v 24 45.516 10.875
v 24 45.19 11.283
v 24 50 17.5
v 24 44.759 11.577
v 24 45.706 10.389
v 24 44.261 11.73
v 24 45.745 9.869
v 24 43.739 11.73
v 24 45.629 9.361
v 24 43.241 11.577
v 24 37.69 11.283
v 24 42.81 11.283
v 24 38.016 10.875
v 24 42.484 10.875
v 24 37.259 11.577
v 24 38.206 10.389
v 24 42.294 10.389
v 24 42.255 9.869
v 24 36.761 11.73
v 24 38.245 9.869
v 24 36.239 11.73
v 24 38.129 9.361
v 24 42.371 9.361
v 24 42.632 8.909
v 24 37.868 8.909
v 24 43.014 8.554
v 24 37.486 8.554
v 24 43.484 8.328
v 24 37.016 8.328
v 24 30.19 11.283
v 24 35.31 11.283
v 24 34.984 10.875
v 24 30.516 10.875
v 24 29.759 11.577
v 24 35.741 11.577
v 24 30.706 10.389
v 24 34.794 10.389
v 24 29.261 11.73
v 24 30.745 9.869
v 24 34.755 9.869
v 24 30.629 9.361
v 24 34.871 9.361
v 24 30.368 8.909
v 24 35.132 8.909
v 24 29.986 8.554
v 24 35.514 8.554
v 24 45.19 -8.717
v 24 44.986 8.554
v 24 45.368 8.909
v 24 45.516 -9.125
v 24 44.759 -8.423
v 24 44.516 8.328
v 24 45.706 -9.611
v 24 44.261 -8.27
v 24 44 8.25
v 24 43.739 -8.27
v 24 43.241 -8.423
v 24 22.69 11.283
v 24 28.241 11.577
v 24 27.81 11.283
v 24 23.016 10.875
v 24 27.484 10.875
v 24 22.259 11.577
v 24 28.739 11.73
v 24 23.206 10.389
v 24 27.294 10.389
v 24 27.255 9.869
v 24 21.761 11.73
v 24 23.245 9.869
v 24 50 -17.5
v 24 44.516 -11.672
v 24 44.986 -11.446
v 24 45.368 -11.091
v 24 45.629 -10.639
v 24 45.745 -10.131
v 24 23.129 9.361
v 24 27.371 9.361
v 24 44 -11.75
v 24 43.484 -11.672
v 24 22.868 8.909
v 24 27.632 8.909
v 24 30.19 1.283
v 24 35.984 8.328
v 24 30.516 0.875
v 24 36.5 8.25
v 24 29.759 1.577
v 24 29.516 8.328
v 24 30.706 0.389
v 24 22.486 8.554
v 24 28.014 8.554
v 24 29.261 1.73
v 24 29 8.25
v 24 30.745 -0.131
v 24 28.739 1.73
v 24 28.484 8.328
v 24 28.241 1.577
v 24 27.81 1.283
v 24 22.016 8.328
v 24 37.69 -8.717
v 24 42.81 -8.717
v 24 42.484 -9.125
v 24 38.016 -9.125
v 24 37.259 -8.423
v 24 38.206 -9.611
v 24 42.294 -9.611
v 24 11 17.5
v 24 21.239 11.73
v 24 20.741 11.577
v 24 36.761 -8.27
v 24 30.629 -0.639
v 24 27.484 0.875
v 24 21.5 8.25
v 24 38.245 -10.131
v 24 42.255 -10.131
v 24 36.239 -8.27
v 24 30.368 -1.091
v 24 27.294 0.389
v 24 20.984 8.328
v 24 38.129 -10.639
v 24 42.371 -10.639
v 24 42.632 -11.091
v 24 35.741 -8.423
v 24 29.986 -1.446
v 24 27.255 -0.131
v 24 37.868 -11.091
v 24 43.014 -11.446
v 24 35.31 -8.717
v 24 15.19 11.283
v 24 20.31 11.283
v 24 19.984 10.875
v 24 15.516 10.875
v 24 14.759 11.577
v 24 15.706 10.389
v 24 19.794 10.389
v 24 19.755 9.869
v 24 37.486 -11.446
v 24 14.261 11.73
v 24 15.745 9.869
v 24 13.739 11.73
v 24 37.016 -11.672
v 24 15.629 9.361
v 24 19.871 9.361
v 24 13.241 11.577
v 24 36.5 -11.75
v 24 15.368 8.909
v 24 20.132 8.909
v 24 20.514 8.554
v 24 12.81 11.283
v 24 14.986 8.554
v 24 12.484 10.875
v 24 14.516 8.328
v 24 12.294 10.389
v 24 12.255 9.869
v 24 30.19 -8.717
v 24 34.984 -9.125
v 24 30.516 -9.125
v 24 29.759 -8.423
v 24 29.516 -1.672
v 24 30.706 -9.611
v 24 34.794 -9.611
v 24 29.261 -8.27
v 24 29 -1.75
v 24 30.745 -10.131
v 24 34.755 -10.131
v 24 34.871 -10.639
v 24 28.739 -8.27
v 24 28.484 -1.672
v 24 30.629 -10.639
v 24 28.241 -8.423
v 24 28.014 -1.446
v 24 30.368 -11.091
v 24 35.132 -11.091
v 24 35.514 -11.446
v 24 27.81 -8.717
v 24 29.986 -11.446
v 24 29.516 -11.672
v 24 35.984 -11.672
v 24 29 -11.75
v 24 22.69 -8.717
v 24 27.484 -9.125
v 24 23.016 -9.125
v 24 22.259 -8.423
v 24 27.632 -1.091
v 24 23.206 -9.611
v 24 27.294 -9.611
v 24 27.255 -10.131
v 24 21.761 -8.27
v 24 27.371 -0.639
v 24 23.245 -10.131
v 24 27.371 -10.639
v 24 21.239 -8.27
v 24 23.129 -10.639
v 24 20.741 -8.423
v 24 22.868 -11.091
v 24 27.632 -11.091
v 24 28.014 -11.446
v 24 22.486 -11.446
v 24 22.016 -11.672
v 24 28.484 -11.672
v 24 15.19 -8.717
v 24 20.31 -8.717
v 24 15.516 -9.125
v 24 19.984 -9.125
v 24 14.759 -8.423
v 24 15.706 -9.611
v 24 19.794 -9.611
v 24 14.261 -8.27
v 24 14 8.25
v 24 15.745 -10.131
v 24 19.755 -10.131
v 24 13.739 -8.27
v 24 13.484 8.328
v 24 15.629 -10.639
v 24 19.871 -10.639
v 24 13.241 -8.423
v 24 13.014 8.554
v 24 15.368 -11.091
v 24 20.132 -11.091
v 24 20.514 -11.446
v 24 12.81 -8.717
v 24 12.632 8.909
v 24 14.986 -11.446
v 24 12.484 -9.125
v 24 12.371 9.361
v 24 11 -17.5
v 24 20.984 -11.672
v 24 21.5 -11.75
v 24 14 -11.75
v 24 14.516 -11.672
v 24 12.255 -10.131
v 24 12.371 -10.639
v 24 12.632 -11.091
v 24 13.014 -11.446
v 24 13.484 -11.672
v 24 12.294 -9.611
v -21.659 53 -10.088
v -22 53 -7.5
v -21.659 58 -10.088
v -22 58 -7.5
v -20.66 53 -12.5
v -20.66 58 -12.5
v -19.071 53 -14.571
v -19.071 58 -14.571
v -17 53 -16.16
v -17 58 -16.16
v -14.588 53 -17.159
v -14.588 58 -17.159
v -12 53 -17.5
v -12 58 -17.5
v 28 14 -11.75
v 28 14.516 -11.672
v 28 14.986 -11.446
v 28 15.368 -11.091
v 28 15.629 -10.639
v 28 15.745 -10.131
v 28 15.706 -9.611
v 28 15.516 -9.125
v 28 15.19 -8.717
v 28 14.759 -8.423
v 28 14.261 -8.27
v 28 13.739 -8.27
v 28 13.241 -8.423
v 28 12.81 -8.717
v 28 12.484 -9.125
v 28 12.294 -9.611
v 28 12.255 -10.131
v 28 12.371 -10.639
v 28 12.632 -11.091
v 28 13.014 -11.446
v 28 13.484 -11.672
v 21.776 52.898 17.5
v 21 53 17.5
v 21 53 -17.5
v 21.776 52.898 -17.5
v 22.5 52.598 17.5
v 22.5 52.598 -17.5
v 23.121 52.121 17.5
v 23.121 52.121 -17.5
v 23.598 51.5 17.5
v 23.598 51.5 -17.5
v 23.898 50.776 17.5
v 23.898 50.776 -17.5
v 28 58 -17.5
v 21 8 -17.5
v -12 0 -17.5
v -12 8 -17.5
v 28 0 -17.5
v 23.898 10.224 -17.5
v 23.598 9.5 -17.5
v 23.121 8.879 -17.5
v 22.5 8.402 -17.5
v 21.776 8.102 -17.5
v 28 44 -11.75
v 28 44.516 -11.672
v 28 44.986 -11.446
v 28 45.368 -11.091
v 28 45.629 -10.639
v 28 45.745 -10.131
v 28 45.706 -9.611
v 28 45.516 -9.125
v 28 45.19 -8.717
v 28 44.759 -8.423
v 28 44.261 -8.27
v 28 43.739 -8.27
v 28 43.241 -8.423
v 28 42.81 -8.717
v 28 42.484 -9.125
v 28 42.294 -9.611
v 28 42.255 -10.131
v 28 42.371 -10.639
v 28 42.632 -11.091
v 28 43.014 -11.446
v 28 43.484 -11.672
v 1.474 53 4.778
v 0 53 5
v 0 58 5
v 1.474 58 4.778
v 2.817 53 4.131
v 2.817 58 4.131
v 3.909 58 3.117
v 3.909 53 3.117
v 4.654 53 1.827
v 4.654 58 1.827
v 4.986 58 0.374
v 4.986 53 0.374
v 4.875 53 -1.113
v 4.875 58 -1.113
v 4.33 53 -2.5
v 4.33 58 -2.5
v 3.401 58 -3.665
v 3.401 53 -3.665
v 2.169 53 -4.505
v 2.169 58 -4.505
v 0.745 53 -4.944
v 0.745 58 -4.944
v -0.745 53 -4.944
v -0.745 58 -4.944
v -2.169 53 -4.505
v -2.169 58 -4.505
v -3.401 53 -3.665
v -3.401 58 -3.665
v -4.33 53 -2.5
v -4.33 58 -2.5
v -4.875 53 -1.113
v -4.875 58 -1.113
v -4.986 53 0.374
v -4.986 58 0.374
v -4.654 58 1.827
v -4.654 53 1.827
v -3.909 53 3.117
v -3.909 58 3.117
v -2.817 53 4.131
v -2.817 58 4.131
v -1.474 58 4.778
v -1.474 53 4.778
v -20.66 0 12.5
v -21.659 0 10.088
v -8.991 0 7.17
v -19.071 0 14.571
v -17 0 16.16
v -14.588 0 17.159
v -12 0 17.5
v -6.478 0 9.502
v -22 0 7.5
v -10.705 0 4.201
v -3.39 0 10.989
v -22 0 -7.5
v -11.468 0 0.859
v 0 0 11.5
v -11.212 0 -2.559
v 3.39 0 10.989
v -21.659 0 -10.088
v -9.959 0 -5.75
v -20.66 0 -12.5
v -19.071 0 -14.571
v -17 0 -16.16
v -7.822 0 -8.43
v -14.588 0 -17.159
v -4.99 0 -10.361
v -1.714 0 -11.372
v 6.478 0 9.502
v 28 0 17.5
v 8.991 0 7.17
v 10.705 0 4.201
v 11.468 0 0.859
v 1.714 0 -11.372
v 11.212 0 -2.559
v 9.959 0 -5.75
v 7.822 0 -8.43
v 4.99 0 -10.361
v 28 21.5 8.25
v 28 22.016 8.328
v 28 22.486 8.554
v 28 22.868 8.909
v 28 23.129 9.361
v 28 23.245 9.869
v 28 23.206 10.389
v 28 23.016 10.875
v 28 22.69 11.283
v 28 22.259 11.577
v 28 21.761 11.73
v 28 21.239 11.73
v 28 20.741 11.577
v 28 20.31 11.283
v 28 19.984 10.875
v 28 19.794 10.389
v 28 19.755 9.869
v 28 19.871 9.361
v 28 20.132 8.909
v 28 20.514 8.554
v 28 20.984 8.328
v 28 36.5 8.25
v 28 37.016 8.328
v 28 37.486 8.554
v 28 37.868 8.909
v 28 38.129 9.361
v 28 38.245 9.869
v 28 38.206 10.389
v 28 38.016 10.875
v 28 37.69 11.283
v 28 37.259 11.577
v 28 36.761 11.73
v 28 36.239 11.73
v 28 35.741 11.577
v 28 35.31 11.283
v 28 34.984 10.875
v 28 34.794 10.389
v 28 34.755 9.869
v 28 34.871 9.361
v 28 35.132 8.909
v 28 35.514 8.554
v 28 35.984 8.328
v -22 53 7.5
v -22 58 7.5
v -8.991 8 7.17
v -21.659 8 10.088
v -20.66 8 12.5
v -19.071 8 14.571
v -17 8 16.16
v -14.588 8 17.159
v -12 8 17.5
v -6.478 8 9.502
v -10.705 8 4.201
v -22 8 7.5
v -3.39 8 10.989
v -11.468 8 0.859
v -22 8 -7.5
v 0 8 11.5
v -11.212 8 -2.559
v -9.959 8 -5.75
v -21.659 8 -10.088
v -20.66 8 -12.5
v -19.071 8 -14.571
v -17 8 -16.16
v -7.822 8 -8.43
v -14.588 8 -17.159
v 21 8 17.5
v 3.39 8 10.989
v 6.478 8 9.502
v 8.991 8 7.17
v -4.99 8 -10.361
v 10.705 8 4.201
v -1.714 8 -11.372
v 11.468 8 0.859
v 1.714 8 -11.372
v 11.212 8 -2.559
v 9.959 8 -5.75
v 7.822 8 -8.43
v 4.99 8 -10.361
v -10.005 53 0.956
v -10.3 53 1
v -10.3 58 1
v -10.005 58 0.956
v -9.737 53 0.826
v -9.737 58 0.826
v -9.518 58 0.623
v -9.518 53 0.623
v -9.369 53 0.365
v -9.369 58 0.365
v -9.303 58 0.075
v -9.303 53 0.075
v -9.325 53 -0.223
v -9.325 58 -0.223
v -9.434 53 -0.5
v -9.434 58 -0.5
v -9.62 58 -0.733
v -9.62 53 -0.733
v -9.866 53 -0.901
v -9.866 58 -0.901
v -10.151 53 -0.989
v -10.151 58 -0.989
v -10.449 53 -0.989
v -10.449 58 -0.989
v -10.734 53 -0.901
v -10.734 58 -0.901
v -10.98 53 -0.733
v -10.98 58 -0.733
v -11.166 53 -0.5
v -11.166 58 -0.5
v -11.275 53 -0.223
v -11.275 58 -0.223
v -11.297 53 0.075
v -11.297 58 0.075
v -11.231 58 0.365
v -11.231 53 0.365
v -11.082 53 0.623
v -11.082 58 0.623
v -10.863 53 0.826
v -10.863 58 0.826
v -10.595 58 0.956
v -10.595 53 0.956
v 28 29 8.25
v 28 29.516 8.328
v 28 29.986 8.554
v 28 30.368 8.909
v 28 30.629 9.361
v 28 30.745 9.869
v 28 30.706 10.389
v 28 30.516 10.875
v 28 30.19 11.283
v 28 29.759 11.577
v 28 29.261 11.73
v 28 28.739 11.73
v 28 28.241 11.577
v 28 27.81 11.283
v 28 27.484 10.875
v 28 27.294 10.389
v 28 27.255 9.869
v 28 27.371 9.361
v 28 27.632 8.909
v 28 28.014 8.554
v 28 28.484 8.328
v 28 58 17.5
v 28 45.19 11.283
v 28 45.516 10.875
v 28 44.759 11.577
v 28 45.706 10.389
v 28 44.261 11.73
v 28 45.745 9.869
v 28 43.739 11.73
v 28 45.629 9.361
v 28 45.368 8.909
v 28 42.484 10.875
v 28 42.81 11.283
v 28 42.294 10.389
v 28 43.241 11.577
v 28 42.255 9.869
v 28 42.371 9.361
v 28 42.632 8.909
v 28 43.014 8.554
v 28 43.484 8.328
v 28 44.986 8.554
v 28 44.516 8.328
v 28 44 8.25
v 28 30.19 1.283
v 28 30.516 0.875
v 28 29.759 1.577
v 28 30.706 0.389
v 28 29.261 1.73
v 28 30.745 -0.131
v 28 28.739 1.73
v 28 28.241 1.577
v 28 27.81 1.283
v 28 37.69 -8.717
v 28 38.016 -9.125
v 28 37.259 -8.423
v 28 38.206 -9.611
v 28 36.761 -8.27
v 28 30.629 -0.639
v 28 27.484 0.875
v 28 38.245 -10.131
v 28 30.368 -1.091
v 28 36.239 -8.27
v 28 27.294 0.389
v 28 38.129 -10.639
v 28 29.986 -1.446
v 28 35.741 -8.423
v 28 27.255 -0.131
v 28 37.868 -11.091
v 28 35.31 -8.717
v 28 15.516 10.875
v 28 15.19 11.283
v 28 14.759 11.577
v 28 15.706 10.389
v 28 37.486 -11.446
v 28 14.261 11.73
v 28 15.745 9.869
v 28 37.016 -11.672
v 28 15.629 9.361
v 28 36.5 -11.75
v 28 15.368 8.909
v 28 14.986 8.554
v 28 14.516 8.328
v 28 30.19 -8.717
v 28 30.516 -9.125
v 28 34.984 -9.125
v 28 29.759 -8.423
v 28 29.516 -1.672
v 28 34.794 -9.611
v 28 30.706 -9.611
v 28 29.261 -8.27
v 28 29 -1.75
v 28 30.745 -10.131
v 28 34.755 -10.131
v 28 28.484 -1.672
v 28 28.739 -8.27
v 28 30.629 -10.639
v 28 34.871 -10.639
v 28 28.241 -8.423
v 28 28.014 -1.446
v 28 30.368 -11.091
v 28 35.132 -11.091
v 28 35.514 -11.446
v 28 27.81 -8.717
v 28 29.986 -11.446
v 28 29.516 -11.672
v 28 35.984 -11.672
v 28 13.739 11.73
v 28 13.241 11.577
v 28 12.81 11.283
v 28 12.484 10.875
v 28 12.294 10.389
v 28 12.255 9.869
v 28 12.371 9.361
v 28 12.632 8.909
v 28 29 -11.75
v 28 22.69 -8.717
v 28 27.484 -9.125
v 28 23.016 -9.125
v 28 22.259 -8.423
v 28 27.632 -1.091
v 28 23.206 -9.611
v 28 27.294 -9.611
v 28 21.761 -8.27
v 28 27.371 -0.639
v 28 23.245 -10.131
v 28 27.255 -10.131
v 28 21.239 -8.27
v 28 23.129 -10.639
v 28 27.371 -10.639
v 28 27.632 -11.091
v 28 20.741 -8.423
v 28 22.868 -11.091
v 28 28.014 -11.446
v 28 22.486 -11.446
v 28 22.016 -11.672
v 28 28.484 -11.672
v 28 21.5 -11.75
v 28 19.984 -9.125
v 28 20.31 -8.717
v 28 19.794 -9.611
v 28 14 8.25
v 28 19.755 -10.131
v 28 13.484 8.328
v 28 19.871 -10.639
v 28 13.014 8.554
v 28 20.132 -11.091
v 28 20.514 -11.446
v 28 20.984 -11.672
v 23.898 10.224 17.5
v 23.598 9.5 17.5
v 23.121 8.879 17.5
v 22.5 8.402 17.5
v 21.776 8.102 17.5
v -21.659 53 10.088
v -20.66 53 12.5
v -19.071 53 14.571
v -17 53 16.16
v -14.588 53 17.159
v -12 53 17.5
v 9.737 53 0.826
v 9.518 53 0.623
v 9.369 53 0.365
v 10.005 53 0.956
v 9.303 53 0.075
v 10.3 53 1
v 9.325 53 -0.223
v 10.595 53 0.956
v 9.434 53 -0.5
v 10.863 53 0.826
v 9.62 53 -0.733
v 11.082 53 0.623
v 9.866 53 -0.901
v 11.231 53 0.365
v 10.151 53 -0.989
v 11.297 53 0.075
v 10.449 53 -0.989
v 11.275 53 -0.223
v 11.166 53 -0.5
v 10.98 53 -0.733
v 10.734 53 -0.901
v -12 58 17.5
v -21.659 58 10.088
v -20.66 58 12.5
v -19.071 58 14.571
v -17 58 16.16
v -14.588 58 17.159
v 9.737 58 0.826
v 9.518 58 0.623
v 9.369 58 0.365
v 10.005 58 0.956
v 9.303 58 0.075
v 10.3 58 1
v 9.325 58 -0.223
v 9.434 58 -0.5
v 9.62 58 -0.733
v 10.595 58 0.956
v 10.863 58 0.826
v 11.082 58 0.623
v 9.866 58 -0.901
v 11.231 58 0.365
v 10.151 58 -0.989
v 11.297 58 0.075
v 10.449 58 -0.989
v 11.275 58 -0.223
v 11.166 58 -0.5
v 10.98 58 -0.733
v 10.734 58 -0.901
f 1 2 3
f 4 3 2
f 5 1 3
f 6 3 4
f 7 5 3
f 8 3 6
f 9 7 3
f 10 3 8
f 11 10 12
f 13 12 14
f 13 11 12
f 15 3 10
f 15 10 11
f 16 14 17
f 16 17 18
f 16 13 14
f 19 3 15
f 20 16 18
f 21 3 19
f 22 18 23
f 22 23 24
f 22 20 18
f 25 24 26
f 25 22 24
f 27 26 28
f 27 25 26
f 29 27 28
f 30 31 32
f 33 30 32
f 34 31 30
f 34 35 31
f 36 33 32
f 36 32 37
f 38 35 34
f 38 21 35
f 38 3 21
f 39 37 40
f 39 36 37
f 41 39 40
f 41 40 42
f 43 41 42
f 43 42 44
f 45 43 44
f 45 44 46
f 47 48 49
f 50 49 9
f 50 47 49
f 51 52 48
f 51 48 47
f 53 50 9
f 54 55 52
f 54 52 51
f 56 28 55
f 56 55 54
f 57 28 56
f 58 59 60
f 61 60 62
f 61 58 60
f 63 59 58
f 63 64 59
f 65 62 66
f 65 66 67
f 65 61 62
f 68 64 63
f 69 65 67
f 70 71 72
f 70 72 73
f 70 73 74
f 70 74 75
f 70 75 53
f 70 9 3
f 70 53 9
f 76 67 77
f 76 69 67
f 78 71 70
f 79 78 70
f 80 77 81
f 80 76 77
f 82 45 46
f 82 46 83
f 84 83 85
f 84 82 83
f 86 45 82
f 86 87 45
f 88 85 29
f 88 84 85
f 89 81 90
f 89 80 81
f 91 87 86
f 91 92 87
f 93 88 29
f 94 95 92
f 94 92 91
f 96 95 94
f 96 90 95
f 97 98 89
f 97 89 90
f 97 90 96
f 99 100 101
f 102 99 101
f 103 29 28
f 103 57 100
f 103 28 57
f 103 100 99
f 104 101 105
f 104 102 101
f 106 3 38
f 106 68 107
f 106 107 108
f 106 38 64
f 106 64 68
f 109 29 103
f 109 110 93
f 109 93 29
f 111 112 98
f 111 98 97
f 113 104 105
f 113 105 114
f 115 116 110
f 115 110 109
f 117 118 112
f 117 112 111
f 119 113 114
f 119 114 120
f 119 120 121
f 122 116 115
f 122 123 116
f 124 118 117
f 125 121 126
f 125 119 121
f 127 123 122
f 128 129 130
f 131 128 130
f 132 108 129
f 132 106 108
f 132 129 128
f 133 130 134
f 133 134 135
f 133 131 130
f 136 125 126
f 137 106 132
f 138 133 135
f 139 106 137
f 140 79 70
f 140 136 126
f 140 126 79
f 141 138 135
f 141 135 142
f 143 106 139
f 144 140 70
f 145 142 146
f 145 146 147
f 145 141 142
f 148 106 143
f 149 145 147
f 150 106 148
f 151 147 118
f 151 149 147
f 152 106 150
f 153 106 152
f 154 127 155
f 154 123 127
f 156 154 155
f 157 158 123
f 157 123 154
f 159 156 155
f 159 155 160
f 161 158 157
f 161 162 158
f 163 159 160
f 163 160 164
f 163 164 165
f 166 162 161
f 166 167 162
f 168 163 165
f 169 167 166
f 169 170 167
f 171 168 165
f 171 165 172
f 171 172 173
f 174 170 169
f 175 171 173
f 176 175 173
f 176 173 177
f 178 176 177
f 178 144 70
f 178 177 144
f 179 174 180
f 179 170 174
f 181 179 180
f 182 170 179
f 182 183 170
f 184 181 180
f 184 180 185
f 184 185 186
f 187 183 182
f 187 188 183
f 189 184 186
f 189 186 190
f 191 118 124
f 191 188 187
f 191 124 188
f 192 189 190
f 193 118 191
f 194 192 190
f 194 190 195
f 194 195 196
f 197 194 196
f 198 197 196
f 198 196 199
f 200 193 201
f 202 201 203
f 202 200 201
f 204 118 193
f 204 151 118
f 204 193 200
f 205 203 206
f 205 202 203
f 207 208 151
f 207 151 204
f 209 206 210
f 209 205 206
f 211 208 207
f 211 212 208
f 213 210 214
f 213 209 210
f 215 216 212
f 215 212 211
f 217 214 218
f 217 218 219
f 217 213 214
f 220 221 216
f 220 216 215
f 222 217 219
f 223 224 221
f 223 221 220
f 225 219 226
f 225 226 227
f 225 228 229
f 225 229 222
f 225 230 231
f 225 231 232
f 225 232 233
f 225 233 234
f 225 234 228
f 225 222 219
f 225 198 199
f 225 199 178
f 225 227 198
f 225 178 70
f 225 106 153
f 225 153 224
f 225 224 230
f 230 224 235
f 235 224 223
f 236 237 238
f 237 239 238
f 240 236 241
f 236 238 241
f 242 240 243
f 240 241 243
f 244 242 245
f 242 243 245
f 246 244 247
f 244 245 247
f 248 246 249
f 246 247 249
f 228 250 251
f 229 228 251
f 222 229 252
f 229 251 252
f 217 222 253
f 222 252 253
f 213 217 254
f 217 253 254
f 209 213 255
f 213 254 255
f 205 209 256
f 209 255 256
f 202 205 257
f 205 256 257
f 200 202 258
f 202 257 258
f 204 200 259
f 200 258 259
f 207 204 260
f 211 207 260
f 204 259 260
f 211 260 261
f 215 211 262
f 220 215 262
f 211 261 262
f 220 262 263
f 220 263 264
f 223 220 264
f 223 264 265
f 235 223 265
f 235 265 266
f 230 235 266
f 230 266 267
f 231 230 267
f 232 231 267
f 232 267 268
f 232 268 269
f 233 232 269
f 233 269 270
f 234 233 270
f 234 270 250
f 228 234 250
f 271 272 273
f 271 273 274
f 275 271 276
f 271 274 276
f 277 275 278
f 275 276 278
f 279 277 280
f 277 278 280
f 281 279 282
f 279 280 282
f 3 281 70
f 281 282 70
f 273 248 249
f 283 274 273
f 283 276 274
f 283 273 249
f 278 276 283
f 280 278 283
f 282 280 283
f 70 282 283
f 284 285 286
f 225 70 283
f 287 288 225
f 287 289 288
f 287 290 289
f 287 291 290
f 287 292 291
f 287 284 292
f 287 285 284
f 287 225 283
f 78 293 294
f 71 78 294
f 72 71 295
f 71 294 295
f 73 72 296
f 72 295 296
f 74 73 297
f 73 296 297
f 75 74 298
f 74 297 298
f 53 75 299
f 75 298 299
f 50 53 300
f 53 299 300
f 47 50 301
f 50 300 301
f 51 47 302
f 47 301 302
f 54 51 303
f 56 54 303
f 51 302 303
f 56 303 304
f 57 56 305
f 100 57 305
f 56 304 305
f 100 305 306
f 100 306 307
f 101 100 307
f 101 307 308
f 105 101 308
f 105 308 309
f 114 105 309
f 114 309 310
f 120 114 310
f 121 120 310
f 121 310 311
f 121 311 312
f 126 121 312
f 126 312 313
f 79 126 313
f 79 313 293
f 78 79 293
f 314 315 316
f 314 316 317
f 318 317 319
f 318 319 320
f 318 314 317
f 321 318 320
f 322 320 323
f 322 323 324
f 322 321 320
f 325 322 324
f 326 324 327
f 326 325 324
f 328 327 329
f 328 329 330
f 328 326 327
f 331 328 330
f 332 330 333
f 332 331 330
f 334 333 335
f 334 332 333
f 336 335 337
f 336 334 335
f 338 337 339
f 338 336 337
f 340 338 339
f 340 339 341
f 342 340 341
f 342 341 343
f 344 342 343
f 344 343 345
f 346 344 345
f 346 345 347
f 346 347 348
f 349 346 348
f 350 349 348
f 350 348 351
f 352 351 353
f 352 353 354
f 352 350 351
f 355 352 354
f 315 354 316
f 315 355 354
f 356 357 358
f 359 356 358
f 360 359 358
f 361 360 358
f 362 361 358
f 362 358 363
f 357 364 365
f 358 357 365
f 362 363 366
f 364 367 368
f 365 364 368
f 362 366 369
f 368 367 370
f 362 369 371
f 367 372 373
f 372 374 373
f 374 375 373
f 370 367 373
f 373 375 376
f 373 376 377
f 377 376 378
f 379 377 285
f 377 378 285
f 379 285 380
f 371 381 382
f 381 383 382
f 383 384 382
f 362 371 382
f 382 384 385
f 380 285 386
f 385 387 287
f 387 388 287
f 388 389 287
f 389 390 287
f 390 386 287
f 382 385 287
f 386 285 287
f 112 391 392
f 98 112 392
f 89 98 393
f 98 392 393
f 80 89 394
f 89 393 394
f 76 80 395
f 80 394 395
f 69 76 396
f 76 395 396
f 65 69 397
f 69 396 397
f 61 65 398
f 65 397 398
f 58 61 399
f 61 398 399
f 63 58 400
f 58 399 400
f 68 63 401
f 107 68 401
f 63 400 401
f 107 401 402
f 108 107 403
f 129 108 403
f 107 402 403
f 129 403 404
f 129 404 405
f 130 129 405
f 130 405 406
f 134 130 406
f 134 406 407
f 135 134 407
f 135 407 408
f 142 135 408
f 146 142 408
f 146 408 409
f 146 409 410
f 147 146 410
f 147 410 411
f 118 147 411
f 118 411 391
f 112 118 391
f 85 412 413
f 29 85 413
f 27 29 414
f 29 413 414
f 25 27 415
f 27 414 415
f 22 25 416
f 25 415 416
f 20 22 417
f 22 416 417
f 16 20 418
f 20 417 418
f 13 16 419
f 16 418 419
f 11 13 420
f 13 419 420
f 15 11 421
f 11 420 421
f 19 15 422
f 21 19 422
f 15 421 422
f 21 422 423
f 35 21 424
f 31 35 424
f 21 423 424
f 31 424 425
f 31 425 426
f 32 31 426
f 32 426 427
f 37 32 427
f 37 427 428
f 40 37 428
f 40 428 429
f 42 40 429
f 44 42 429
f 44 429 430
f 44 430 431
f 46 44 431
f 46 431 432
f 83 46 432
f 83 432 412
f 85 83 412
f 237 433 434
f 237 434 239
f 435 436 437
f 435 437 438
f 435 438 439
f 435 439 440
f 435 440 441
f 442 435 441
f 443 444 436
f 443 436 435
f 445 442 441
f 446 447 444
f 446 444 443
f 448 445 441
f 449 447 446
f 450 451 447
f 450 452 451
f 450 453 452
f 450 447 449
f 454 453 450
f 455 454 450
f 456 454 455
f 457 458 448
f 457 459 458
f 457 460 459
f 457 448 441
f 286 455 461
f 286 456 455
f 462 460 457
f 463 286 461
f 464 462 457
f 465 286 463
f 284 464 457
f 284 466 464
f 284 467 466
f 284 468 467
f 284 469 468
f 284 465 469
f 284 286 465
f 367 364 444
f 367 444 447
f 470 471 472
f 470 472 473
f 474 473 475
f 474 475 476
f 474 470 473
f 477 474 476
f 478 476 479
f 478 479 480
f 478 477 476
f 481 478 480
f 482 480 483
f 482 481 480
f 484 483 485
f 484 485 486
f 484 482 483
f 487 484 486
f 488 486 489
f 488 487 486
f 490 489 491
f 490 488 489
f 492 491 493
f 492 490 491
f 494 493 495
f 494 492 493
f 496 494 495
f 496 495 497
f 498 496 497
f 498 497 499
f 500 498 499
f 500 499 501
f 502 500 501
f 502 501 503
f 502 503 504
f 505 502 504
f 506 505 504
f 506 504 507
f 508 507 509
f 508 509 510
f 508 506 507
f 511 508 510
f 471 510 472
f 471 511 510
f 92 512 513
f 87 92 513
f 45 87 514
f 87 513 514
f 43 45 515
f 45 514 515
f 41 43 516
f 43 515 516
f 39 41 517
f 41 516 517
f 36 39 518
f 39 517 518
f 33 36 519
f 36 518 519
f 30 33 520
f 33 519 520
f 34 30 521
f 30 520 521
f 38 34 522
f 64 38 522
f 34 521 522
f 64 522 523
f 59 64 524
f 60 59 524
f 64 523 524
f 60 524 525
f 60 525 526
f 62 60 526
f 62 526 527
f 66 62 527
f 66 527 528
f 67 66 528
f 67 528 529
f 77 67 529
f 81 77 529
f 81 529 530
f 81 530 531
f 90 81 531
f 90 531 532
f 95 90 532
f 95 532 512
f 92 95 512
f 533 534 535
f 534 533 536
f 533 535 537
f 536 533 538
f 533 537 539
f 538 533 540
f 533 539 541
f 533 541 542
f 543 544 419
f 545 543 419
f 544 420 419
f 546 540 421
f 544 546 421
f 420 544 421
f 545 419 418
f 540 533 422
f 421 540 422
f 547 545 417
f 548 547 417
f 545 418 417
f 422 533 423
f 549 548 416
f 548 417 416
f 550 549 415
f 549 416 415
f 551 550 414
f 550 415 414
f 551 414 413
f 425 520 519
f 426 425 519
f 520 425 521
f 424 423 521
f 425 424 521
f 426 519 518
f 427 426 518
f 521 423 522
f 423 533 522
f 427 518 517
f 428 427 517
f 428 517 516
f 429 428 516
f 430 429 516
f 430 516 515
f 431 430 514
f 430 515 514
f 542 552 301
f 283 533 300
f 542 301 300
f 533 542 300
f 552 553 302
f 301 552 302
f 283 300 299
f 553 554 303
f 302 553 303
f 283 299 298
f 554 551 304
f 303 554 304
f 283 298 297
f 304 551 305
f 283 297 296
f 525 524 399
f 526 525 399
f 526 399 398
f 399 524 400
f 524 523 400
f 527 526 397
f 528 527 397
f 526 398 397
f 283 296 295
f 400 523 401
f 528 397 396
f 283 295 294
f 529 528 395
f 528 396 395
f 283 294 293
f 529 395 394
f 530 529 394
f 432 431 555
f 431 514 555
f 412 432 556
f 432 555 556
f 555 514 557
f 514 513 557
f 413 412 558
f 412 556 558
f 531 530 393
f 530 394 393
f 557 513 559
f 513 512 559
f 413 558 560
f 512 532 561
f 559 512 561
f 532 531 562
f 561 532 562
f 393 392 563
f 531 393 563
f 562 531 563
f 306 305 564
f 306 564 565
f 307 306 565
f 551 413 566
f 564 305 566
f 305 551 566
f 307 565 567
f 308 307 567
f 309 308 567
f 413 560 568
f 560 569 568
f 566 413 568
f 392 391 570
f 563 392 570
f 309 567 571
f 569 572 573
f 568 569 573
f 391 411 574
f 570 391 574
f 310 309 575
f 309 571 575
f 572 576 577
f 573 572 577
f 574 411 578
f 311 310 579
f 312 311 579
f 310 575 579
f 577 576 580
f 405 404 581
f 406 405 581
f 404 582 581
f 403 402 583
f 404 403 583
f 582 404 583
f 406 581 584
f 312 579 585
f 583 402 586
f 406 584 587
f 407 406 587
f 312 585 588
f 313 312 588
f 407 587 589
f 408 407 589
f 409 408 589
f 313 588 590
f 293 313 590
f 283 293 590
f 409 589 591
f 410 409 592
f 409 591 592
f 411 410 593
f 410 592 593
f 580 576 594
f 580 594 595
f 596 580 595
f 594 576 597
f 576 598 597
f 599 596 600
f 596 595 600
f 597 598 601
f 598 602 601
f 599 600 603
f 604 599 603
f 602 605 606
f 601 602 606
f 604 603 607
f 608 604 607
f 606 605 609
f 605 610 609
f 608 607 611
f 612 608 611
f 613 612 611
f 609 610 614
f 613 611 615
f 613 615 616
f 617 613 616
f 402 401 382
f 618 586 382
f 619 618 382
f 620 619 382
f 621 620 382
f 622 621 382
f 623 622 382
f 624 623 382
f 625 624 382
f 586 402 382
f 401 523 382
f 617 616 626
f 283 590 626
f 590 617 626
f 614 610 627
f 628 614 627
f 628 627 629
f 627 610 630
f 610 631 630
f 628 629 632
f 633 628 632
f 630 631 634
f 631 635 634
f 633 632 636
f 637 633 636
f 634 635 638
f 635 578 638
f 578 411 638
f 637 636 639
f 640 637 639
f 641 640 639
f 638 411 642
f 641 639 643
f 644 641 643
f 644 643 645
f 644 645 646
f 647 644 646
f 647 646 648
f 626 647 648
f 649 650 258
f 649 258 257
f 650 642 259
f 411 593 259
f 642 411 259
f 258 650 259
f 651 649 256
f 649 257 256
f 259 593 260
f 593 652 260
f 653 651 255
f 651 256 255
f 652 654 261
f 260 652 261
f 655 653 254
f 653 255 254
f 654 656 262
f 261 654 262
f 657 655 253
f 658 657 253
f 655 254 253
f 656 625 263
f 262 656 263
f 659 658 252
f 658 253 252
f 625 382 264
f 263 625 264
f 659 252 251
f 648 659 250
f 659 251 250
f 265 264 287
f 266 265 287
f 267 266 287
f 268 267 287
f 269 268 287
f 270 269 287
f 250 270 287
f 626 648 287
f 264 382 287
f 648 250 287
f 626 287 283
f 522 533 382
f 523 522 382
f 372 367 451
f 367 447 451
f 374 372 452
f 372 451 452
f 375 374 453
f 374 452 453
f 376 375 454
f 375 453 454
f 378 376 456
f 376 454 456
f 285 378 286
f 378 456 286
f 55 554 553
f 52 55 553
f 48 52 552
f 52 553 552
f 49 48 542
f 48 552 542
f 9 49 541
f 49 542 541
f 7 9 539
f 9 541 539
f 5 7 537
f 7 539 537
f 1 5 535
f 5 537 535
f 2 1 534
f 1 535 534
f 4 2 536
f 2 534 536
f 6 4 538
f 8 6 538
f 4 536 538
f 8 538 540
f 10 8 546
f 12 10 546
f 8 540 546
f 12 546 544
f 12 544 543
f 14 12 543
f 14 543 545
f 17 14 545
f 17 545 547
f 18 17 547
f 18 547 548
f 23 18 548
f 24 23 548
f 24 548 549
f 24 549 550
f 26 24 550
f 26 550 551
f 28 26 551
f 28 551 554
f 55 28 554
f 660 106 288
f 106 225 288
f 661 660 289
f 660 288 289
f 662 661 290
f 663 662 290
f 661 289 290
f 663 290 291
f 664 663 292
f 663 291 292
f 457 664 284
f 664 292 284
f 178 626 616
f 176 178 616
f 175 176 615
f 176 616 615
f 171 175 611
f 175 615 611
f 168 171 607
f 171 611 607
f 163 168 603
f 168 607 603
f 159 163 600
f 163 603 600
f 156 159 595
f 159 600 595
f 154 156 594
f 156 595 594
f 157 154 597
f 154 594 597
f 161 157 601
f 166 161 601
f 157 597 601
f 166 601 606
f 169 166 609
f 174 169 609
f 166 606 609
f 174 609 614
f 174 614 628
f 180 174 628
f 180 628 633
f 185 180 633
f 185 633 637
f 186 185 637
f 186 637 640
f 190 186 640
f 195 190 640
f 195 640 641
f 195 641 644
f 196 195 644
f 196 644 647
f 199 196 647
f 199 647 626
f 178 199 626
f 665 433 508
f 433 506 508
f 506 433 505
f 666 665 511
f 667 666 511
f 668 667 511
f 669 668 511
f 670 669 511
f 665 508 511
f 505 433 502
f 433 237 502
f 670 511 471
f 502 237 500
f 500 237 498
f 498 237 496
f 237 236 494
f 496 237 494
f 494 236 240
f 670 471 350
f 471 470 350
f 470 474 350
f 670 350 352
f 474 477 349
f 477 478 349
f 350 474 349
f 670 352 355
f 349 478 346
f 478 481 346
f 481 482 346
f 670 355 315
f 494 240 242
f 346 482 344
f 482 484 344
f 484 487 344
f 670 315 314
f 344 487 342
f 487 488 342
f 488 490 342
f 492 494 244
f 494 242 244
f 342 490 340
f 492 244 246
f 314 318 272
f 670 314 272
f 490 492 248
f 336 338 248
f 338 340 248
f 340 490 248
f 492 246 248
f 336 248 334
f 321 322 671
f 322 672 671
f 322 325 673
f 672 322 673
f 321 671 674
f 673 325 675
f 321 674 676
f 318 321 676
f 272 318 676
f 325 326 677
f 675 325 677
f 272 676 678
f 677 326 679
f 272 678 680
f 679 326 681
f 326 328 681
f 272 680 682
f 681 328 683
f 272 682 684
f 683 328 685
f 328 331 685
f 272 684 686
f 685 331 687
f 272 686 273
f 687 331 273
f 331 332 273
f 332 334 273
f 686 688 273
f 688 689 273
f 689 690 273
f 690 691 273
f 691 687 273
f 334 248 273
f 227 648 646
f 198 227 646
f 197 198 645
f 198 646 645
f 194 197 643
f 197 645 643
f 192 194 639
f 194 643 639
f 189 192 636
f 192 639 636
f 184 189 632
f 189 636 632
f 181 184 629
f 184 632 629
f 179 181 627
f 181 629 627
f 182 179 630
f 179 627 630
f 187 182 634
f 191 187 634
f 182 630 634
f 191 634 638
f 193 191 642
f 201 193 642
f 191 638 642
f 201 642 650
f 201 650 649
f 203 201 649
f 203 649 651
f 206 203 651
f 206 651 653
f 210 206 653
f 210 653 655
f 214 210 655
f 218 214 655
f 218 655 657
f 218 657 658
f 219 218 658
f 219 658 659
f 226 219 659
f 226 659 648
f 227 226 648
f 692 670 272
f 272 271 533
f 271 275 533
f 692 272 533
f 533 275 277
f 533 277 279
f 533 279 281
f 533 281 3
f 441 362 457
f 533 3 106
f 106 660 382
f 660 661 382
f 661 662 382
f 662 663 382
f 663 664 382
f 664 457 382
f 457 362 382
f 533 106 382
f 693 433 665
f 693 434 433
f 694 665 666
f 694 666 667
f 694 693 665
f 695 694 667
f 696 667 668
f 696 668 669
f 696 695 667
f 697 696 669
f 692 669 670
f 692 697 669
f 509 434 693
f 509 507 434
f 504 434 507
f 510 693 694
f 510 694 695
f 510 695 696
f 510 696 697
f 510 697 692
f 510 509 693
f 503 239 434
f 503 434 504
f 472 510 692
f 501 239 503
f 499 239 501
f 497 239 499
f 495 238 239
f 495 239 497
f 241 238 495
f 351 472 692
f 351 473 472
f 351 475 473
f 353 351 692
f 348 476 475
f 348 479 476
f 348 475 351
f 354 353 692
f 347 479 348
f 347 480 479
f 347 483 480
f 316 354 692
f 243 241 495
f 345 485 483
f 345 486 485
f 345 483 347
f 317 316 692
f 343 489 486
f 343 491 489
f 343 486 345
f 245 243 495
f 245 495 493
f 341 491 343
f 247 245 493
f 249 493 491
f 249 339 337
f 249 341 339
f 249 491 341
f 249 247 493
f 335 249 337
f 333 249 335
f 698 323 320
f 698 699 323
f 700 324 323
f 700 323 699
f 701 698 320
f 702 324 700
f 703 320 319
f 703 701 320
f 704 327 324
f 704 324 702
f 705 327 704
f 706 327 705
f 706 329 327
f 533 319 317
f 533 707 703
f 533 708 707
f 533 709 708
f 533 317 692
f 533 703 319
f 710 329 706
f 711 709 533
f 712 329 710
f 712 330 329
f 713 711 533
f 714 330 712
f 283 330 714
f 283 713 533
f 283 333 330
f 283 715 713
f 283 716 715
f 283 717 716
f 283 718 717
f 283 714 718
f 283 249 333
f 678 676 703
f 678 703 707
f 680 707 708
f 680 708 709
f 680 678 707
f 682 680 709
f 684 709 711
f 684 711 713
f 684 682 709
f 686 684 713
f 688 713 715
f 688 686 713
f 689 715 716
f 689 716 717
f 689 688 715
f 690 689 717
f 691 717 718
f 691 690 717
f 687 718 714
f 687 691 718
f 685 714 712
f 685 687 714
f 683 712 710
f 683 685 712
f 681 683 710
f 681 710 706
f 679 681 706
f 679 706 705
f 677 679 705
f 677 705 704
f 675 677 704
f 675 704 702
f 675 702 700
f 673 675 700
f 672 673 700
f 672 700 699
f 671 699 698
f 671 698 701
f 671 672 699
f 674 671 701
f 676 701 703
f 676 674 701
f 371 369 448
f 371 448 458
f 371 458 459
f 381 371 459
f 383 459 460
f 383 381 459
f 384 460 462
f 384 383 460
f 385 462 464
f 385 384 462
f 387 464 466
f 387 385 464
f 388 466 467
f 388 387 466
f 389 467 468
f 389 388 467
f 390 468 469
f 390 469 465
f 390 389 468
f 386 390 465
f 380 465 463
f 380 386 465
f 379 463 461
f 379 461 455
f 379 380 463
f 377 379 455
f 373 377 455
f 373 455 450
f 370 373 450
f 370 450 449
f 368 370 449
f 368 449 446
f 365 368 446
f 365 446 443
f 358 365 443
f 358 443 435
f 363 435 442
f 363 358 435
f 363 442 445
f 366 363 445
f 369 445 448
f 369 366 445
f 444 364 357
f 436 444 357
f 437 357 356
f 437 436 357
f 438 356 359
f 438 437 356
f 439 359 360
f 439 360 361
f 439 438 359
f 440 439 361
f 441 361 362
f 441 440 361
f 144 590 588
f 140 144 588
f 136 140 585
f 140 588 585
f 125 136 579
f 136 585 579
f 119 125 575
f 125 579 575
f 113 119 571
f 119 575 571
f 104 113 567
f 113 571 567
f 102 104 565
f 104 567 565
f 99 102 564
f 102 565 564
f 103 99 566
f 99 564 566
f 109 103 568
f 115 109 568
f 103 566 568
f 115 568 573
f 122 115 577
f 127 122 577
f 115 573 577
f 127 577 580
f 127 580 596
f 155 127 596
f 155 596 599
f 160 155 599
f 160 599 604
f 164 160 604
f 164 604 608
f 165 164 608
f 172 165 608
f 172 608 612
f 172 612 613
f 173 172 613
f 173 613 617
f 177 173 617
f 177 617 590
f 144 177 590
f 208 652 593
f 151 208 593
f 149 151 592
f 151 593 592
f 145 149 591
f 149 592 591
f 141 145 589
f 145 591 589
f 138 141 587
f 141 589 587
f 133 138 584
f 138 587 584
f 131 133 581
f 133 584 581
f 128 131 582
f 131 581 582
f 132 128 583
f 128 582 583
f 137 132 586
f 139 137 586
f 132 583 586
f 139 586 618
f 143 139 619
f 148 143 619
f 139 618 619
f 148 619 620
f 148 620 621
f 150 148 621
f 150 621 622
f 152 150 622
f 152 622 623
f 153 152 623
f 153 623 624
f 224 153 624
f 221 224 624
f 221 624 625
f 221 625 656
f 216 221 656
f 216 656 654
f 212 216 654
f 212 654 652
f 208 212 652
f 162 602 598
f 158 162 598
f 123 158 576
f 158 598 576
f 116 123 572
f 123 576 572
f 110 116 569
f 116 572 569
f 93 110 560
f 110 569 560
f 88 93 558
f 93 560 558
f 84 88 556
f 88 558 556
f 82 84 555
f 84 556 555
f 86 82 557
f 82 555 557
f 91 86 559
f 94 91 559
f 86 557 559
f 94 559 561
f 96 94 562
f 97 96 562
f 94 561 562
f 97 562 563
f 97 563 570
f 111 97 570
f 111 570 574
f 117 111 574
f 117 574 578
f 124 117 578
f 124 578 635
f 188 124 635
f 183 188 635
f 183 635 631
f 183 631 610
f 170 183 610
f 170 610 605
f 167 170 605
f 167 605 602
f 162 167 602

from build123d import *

# Parameters (mm, degrees)
SKETCH1_W           = 50
SKETCH1_H           = 35
SKETCH1_R           = 11.5
BOSS_EXTRUDE1_DEPTH = 8
SKETCH2_W           = 4
SKETCH2_H           = 35
BOSS_EXTRUDE2_DEPTH = 45
SKETCH3_W           = 50
SKETCH3_H           = 35
SKETCH3_R           = 5
SKETCH3_R_2         = 1
BOSS_EXTRUDE3_DEPTH = 5
FILLET1_R           = 10
FILLET2_R           = 3
SKETCH4_R           = 1.75
CUT_EXTRUDE1_DEPTH  = 79.550938887


with BuildPart() as part:
    # Sketch1 → Boss-Extrude1 (new body)
    with BuildSketch(Plane(origin=(0, 0, 0), x_dir=(1, 0, 0), z_dir=(0, 1, 0))):
        with Locations((3, 0)):
            Rectangle(SKETCH1_W, SKETCH1_H)
        Circle(SKETCH1_R, mode=Mode.SUBTRACT)
    extrude(amount=BOSS_EXTRUDE1_DEPTH)

    # Sketch2 → Boss-Extrude2 (add)
    with BuildSketch(Plane(origin=(0, 8, 0), x_dir=(1, 0, 0), z_dir=(0, 1, 0))):
        with Locations((26, 0)):
            Rectangle(SKETCH2_W, SKETCH2_H)
    extrude(amount=BOSS_EXTRUDE2_DEPTH)

    # Sketch3 → Boss-Extrude3 (add)
    with BuildSketch(Plane(origin=(0, 53, 0), x_dir=(1, 0, 0), z_dir=(0, 1, 0))):
        with Locations((3, 0)):
            Rectangle(SKETCH3_W, SKETCH3_H)
        Circle(SKETCH3_R, mode=Mode.SUBTRACT)
        with Locations((10.3, 0)):
            Circle(SKETCH3_R_2, mode=Mode.SUBTRACT)
        with Locations((-10.3, 0)):
            Circle(SKETCH3_R_2, mode=Mode.SUBTRACT)
    extrude(amount=BOSS_EXTRUDE3_DEPTH)

    # Fillet1
    fillet1_edges = [part.edges().sort_by_distance(p)[0] for p in [
        (-22, 55.5, 17.5),
        (-22, 55.5, -17.5),
        (-22, 4, -17.5),
        (-22, 4, 17.5),
    ]]
    fillet(fillet1_edges, radius=FILLET1_R)

    # Fillet2
    fillet2_edges = [part.edges().sort_by_distance(p)[0] for p in [
        (24, 53, 0),
        (24, 8, 0),
    ]]
    fillet(fillet2_edges, radius=FILLET2_R)

    # Sketch4 → Cut-Extrude1 (cut, through all)
    with BuildSketch(Plane(origin=(28, 0, 0), x_dir=(0, 0, -1), z_dir=(1, 0, 0))):
        with Locations((0, 29)):
            Circle(SKETCH4_R)
        with Locations((-10, 36.5)):
            Circle(SKETCH4_R)
        with Locations((10, 21.5)):
            Circle(SKETCH4_R)
        with Locations((-10, 44)):
            Circle(SKETCH4_R)
        with Locations((-10, 14)):
            Circle(SKETCH4_R)
        with Locations((10, 14)):
            Circle(SKETCH4_R)
        with Locations((-10, 29)):
            Circle(SKETCH4_R)
        with Locations((10, 29)):
            Circle(SKETCH4_R)
        with Locations((-10, 21.5)):
            Circle(SKETCH4_R)
        with Locations((10, 36.5)):
            Circle(SKETCH4_R)
        with Locations((10, 44)):
            Circle(SKETCH4_R)
    extrude(amount=-CUT_EXTRUDE1_DEPTH, mode=Mode.SUBTRACT)


solid = part.part
